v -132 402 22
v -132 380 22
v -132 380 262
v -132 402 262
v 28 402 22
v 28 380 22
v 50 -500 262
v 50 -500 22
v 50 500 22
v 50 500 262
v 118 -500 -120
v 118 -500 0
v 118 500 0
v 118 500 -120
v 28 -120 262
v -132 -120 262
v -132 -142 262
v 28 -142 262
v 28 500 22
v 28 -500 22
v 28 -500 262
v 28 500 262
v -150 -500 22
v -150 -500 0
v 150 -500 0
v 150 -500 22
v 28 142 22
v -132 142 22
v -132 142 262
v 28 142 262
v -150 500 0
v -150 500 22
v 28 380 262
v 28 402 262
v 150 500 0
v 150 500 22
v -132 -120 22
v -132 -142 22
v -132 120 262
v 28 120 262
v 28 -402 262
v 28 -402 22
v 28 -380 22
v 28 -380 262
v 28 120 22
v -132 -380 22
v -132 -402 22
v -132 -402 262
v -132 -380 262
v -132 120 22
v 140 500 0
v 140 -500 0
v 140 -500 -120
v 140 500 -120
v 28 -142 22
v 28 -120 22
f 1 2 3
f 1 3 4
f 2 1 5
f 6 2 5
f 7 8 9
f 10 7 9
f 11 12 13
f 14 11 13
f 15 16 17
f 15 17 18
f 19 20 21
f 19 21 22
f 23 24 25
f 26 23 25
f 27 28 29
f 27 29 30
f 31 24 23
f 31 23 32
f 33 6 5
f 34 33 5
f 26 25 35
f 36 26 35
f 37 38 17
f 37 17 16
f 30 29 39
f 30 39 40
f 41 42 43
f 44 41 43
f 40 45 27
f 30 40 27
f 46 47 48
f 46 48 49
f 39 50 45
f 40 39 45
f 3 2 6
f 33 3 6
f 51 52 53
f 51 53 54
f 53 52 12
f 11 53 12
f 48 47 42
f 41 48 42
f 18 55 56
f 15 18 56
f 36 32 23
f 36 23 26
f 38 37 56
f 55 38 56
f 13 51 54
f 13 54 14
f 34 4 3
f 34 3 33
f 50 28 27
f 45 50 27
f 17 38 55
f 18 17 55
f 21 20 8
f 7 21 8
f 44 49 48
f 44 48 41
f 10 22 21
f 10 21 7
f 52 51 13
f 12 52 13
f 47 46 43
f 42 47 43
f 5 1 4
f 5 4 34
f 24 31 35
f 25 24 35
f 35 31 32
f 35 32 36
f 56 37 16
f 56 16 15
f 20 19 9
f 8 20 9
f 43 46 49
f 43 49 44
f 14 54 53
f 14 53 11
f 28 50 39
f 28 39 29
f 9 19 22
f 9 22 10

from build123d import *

# Parameters (mm, degrees)
SKIZZE1_W                         = 300
SKIZZE1_H                         = 1000
AUFSATZ_LINEAR_AUSTRAGEN1_DEPTH   = 22
SKIZZE2_W                         = 22
SKIZZE2_H                         = 1000
AUFSATZ_LINEAR_AUSTRAGEN2_DEPTH   = 240
SKIZZE3_W                         = 160
SKIZZE3_H                         = 22
AUFSATZ_LINEAR_AUSTRAGEN3_DEPTH   = 240
AUFSATZ_LINEAR_AUSTRAGEN3_2_DEPTH = 240
AUFSATZ_LINEAR_AUSTRAGEN3_3_DEPTH = 240
AUFSATZ_LINEAR_AUSTRAGEN3_4_DEPTH = 240
SKIZZE4_W                         = 22
SKIZZE4_H                         = 1000
AUFSATZ_LINEAR_AUSTRAGEN4_DEPTH   = 120


with BuildPart() as part:
    # Skizze1 → Aufsatz-Linear austragen1 (new body)
    with BuildSketch(Plane.XY):
        Rectangle(SKIZZE1_W, SKIZZE1_H)
    extrude(amount=AUFSATZ_LINEAR_AUSTRAGEN1_DEPTH)


with BuildPart() as body_2:
    # Skizze2 → Aufsatz-Linear austragen2 (new body)
    with BuildSketch(Plane.XY.offset(22)):
        with Locations((39, 0)):
            Rectangle(SKIZZE2_W, SKIZZE2_H)
    extrude(amount=AUFSATZ_LINEAR_AUSTRAGEN2_DEPTH)


with BuildPart() as body_3:
    # Skizze3 → Aufsatz-Linear austragen3 (new body)
    with BuildSketch(Plane.XY.offset(22)):
        with Locations((-52, -391)):
            Rectangle(SKIZZE3_W, SKIZZE3_H)
    extrude(amount=AUFSATZ_LINEAR_AUSTRAGEN3_DEPTH)


with BuildPart() as body_4:
    # Skizze3 → Aufsatz-Linear austragen3 2 (new body)
    with BuildSketch(Plane.XY.offset(22)):
        with Locations((-52, 391)):
            Rectangle(SKIZZE3_W, SKIZZE3_H)
    extrude(amount=AUFSATZ_LINEAR_AUSTRAGEN3_2_DEPTH)


with BuildPart() as body_5:
    # Skizze3 → Aufsatz-Linear austragen3 3 (new body)
    with BuildSketch(Plane.XY.offset(22)):
        with Locations((-52, -131)):
            Rectangle(SKIZZE3_W, SKIZZE3_H)
    extrude(amount=AUFSATZ_LINEAR_AUSTRAGEN3_3_DEPTH)


with BuildPart() as body_6:
    # Skizze3 → Aufsatz-Linear austragen3 4 (new body)
    with BuildSketch(Plane.XY.offset(22)):
        with Locations((-52, 131)):
            Rectangle(SKIZZE3_W, SKIZZE3_H)
    extrude(amount=AUFSATZ_LINEAR_AUSTRAGEN3_4_DEPTH)


with BuildPart() as body_7:
    # Skizze4 → Aufsatz-Linear austragen4 (new body)
    with BuildSketch(Plane(origin=(0, 0, 0), x_dir=(-1, 0, 0), z_dir=(0, 0, -1))):
        with Locations((-129, 0)):
            Rectangle(SKIZZE4_W, SKIZZE4_H)
    extrude(amount=AUFSATZ_LINEAR_AUSTRAGEN4_DEPTH)


solid = Compound([part.part, body_2.part, body_3.part, body_4.part, body_5.part, body_6.part, body_7.part])
